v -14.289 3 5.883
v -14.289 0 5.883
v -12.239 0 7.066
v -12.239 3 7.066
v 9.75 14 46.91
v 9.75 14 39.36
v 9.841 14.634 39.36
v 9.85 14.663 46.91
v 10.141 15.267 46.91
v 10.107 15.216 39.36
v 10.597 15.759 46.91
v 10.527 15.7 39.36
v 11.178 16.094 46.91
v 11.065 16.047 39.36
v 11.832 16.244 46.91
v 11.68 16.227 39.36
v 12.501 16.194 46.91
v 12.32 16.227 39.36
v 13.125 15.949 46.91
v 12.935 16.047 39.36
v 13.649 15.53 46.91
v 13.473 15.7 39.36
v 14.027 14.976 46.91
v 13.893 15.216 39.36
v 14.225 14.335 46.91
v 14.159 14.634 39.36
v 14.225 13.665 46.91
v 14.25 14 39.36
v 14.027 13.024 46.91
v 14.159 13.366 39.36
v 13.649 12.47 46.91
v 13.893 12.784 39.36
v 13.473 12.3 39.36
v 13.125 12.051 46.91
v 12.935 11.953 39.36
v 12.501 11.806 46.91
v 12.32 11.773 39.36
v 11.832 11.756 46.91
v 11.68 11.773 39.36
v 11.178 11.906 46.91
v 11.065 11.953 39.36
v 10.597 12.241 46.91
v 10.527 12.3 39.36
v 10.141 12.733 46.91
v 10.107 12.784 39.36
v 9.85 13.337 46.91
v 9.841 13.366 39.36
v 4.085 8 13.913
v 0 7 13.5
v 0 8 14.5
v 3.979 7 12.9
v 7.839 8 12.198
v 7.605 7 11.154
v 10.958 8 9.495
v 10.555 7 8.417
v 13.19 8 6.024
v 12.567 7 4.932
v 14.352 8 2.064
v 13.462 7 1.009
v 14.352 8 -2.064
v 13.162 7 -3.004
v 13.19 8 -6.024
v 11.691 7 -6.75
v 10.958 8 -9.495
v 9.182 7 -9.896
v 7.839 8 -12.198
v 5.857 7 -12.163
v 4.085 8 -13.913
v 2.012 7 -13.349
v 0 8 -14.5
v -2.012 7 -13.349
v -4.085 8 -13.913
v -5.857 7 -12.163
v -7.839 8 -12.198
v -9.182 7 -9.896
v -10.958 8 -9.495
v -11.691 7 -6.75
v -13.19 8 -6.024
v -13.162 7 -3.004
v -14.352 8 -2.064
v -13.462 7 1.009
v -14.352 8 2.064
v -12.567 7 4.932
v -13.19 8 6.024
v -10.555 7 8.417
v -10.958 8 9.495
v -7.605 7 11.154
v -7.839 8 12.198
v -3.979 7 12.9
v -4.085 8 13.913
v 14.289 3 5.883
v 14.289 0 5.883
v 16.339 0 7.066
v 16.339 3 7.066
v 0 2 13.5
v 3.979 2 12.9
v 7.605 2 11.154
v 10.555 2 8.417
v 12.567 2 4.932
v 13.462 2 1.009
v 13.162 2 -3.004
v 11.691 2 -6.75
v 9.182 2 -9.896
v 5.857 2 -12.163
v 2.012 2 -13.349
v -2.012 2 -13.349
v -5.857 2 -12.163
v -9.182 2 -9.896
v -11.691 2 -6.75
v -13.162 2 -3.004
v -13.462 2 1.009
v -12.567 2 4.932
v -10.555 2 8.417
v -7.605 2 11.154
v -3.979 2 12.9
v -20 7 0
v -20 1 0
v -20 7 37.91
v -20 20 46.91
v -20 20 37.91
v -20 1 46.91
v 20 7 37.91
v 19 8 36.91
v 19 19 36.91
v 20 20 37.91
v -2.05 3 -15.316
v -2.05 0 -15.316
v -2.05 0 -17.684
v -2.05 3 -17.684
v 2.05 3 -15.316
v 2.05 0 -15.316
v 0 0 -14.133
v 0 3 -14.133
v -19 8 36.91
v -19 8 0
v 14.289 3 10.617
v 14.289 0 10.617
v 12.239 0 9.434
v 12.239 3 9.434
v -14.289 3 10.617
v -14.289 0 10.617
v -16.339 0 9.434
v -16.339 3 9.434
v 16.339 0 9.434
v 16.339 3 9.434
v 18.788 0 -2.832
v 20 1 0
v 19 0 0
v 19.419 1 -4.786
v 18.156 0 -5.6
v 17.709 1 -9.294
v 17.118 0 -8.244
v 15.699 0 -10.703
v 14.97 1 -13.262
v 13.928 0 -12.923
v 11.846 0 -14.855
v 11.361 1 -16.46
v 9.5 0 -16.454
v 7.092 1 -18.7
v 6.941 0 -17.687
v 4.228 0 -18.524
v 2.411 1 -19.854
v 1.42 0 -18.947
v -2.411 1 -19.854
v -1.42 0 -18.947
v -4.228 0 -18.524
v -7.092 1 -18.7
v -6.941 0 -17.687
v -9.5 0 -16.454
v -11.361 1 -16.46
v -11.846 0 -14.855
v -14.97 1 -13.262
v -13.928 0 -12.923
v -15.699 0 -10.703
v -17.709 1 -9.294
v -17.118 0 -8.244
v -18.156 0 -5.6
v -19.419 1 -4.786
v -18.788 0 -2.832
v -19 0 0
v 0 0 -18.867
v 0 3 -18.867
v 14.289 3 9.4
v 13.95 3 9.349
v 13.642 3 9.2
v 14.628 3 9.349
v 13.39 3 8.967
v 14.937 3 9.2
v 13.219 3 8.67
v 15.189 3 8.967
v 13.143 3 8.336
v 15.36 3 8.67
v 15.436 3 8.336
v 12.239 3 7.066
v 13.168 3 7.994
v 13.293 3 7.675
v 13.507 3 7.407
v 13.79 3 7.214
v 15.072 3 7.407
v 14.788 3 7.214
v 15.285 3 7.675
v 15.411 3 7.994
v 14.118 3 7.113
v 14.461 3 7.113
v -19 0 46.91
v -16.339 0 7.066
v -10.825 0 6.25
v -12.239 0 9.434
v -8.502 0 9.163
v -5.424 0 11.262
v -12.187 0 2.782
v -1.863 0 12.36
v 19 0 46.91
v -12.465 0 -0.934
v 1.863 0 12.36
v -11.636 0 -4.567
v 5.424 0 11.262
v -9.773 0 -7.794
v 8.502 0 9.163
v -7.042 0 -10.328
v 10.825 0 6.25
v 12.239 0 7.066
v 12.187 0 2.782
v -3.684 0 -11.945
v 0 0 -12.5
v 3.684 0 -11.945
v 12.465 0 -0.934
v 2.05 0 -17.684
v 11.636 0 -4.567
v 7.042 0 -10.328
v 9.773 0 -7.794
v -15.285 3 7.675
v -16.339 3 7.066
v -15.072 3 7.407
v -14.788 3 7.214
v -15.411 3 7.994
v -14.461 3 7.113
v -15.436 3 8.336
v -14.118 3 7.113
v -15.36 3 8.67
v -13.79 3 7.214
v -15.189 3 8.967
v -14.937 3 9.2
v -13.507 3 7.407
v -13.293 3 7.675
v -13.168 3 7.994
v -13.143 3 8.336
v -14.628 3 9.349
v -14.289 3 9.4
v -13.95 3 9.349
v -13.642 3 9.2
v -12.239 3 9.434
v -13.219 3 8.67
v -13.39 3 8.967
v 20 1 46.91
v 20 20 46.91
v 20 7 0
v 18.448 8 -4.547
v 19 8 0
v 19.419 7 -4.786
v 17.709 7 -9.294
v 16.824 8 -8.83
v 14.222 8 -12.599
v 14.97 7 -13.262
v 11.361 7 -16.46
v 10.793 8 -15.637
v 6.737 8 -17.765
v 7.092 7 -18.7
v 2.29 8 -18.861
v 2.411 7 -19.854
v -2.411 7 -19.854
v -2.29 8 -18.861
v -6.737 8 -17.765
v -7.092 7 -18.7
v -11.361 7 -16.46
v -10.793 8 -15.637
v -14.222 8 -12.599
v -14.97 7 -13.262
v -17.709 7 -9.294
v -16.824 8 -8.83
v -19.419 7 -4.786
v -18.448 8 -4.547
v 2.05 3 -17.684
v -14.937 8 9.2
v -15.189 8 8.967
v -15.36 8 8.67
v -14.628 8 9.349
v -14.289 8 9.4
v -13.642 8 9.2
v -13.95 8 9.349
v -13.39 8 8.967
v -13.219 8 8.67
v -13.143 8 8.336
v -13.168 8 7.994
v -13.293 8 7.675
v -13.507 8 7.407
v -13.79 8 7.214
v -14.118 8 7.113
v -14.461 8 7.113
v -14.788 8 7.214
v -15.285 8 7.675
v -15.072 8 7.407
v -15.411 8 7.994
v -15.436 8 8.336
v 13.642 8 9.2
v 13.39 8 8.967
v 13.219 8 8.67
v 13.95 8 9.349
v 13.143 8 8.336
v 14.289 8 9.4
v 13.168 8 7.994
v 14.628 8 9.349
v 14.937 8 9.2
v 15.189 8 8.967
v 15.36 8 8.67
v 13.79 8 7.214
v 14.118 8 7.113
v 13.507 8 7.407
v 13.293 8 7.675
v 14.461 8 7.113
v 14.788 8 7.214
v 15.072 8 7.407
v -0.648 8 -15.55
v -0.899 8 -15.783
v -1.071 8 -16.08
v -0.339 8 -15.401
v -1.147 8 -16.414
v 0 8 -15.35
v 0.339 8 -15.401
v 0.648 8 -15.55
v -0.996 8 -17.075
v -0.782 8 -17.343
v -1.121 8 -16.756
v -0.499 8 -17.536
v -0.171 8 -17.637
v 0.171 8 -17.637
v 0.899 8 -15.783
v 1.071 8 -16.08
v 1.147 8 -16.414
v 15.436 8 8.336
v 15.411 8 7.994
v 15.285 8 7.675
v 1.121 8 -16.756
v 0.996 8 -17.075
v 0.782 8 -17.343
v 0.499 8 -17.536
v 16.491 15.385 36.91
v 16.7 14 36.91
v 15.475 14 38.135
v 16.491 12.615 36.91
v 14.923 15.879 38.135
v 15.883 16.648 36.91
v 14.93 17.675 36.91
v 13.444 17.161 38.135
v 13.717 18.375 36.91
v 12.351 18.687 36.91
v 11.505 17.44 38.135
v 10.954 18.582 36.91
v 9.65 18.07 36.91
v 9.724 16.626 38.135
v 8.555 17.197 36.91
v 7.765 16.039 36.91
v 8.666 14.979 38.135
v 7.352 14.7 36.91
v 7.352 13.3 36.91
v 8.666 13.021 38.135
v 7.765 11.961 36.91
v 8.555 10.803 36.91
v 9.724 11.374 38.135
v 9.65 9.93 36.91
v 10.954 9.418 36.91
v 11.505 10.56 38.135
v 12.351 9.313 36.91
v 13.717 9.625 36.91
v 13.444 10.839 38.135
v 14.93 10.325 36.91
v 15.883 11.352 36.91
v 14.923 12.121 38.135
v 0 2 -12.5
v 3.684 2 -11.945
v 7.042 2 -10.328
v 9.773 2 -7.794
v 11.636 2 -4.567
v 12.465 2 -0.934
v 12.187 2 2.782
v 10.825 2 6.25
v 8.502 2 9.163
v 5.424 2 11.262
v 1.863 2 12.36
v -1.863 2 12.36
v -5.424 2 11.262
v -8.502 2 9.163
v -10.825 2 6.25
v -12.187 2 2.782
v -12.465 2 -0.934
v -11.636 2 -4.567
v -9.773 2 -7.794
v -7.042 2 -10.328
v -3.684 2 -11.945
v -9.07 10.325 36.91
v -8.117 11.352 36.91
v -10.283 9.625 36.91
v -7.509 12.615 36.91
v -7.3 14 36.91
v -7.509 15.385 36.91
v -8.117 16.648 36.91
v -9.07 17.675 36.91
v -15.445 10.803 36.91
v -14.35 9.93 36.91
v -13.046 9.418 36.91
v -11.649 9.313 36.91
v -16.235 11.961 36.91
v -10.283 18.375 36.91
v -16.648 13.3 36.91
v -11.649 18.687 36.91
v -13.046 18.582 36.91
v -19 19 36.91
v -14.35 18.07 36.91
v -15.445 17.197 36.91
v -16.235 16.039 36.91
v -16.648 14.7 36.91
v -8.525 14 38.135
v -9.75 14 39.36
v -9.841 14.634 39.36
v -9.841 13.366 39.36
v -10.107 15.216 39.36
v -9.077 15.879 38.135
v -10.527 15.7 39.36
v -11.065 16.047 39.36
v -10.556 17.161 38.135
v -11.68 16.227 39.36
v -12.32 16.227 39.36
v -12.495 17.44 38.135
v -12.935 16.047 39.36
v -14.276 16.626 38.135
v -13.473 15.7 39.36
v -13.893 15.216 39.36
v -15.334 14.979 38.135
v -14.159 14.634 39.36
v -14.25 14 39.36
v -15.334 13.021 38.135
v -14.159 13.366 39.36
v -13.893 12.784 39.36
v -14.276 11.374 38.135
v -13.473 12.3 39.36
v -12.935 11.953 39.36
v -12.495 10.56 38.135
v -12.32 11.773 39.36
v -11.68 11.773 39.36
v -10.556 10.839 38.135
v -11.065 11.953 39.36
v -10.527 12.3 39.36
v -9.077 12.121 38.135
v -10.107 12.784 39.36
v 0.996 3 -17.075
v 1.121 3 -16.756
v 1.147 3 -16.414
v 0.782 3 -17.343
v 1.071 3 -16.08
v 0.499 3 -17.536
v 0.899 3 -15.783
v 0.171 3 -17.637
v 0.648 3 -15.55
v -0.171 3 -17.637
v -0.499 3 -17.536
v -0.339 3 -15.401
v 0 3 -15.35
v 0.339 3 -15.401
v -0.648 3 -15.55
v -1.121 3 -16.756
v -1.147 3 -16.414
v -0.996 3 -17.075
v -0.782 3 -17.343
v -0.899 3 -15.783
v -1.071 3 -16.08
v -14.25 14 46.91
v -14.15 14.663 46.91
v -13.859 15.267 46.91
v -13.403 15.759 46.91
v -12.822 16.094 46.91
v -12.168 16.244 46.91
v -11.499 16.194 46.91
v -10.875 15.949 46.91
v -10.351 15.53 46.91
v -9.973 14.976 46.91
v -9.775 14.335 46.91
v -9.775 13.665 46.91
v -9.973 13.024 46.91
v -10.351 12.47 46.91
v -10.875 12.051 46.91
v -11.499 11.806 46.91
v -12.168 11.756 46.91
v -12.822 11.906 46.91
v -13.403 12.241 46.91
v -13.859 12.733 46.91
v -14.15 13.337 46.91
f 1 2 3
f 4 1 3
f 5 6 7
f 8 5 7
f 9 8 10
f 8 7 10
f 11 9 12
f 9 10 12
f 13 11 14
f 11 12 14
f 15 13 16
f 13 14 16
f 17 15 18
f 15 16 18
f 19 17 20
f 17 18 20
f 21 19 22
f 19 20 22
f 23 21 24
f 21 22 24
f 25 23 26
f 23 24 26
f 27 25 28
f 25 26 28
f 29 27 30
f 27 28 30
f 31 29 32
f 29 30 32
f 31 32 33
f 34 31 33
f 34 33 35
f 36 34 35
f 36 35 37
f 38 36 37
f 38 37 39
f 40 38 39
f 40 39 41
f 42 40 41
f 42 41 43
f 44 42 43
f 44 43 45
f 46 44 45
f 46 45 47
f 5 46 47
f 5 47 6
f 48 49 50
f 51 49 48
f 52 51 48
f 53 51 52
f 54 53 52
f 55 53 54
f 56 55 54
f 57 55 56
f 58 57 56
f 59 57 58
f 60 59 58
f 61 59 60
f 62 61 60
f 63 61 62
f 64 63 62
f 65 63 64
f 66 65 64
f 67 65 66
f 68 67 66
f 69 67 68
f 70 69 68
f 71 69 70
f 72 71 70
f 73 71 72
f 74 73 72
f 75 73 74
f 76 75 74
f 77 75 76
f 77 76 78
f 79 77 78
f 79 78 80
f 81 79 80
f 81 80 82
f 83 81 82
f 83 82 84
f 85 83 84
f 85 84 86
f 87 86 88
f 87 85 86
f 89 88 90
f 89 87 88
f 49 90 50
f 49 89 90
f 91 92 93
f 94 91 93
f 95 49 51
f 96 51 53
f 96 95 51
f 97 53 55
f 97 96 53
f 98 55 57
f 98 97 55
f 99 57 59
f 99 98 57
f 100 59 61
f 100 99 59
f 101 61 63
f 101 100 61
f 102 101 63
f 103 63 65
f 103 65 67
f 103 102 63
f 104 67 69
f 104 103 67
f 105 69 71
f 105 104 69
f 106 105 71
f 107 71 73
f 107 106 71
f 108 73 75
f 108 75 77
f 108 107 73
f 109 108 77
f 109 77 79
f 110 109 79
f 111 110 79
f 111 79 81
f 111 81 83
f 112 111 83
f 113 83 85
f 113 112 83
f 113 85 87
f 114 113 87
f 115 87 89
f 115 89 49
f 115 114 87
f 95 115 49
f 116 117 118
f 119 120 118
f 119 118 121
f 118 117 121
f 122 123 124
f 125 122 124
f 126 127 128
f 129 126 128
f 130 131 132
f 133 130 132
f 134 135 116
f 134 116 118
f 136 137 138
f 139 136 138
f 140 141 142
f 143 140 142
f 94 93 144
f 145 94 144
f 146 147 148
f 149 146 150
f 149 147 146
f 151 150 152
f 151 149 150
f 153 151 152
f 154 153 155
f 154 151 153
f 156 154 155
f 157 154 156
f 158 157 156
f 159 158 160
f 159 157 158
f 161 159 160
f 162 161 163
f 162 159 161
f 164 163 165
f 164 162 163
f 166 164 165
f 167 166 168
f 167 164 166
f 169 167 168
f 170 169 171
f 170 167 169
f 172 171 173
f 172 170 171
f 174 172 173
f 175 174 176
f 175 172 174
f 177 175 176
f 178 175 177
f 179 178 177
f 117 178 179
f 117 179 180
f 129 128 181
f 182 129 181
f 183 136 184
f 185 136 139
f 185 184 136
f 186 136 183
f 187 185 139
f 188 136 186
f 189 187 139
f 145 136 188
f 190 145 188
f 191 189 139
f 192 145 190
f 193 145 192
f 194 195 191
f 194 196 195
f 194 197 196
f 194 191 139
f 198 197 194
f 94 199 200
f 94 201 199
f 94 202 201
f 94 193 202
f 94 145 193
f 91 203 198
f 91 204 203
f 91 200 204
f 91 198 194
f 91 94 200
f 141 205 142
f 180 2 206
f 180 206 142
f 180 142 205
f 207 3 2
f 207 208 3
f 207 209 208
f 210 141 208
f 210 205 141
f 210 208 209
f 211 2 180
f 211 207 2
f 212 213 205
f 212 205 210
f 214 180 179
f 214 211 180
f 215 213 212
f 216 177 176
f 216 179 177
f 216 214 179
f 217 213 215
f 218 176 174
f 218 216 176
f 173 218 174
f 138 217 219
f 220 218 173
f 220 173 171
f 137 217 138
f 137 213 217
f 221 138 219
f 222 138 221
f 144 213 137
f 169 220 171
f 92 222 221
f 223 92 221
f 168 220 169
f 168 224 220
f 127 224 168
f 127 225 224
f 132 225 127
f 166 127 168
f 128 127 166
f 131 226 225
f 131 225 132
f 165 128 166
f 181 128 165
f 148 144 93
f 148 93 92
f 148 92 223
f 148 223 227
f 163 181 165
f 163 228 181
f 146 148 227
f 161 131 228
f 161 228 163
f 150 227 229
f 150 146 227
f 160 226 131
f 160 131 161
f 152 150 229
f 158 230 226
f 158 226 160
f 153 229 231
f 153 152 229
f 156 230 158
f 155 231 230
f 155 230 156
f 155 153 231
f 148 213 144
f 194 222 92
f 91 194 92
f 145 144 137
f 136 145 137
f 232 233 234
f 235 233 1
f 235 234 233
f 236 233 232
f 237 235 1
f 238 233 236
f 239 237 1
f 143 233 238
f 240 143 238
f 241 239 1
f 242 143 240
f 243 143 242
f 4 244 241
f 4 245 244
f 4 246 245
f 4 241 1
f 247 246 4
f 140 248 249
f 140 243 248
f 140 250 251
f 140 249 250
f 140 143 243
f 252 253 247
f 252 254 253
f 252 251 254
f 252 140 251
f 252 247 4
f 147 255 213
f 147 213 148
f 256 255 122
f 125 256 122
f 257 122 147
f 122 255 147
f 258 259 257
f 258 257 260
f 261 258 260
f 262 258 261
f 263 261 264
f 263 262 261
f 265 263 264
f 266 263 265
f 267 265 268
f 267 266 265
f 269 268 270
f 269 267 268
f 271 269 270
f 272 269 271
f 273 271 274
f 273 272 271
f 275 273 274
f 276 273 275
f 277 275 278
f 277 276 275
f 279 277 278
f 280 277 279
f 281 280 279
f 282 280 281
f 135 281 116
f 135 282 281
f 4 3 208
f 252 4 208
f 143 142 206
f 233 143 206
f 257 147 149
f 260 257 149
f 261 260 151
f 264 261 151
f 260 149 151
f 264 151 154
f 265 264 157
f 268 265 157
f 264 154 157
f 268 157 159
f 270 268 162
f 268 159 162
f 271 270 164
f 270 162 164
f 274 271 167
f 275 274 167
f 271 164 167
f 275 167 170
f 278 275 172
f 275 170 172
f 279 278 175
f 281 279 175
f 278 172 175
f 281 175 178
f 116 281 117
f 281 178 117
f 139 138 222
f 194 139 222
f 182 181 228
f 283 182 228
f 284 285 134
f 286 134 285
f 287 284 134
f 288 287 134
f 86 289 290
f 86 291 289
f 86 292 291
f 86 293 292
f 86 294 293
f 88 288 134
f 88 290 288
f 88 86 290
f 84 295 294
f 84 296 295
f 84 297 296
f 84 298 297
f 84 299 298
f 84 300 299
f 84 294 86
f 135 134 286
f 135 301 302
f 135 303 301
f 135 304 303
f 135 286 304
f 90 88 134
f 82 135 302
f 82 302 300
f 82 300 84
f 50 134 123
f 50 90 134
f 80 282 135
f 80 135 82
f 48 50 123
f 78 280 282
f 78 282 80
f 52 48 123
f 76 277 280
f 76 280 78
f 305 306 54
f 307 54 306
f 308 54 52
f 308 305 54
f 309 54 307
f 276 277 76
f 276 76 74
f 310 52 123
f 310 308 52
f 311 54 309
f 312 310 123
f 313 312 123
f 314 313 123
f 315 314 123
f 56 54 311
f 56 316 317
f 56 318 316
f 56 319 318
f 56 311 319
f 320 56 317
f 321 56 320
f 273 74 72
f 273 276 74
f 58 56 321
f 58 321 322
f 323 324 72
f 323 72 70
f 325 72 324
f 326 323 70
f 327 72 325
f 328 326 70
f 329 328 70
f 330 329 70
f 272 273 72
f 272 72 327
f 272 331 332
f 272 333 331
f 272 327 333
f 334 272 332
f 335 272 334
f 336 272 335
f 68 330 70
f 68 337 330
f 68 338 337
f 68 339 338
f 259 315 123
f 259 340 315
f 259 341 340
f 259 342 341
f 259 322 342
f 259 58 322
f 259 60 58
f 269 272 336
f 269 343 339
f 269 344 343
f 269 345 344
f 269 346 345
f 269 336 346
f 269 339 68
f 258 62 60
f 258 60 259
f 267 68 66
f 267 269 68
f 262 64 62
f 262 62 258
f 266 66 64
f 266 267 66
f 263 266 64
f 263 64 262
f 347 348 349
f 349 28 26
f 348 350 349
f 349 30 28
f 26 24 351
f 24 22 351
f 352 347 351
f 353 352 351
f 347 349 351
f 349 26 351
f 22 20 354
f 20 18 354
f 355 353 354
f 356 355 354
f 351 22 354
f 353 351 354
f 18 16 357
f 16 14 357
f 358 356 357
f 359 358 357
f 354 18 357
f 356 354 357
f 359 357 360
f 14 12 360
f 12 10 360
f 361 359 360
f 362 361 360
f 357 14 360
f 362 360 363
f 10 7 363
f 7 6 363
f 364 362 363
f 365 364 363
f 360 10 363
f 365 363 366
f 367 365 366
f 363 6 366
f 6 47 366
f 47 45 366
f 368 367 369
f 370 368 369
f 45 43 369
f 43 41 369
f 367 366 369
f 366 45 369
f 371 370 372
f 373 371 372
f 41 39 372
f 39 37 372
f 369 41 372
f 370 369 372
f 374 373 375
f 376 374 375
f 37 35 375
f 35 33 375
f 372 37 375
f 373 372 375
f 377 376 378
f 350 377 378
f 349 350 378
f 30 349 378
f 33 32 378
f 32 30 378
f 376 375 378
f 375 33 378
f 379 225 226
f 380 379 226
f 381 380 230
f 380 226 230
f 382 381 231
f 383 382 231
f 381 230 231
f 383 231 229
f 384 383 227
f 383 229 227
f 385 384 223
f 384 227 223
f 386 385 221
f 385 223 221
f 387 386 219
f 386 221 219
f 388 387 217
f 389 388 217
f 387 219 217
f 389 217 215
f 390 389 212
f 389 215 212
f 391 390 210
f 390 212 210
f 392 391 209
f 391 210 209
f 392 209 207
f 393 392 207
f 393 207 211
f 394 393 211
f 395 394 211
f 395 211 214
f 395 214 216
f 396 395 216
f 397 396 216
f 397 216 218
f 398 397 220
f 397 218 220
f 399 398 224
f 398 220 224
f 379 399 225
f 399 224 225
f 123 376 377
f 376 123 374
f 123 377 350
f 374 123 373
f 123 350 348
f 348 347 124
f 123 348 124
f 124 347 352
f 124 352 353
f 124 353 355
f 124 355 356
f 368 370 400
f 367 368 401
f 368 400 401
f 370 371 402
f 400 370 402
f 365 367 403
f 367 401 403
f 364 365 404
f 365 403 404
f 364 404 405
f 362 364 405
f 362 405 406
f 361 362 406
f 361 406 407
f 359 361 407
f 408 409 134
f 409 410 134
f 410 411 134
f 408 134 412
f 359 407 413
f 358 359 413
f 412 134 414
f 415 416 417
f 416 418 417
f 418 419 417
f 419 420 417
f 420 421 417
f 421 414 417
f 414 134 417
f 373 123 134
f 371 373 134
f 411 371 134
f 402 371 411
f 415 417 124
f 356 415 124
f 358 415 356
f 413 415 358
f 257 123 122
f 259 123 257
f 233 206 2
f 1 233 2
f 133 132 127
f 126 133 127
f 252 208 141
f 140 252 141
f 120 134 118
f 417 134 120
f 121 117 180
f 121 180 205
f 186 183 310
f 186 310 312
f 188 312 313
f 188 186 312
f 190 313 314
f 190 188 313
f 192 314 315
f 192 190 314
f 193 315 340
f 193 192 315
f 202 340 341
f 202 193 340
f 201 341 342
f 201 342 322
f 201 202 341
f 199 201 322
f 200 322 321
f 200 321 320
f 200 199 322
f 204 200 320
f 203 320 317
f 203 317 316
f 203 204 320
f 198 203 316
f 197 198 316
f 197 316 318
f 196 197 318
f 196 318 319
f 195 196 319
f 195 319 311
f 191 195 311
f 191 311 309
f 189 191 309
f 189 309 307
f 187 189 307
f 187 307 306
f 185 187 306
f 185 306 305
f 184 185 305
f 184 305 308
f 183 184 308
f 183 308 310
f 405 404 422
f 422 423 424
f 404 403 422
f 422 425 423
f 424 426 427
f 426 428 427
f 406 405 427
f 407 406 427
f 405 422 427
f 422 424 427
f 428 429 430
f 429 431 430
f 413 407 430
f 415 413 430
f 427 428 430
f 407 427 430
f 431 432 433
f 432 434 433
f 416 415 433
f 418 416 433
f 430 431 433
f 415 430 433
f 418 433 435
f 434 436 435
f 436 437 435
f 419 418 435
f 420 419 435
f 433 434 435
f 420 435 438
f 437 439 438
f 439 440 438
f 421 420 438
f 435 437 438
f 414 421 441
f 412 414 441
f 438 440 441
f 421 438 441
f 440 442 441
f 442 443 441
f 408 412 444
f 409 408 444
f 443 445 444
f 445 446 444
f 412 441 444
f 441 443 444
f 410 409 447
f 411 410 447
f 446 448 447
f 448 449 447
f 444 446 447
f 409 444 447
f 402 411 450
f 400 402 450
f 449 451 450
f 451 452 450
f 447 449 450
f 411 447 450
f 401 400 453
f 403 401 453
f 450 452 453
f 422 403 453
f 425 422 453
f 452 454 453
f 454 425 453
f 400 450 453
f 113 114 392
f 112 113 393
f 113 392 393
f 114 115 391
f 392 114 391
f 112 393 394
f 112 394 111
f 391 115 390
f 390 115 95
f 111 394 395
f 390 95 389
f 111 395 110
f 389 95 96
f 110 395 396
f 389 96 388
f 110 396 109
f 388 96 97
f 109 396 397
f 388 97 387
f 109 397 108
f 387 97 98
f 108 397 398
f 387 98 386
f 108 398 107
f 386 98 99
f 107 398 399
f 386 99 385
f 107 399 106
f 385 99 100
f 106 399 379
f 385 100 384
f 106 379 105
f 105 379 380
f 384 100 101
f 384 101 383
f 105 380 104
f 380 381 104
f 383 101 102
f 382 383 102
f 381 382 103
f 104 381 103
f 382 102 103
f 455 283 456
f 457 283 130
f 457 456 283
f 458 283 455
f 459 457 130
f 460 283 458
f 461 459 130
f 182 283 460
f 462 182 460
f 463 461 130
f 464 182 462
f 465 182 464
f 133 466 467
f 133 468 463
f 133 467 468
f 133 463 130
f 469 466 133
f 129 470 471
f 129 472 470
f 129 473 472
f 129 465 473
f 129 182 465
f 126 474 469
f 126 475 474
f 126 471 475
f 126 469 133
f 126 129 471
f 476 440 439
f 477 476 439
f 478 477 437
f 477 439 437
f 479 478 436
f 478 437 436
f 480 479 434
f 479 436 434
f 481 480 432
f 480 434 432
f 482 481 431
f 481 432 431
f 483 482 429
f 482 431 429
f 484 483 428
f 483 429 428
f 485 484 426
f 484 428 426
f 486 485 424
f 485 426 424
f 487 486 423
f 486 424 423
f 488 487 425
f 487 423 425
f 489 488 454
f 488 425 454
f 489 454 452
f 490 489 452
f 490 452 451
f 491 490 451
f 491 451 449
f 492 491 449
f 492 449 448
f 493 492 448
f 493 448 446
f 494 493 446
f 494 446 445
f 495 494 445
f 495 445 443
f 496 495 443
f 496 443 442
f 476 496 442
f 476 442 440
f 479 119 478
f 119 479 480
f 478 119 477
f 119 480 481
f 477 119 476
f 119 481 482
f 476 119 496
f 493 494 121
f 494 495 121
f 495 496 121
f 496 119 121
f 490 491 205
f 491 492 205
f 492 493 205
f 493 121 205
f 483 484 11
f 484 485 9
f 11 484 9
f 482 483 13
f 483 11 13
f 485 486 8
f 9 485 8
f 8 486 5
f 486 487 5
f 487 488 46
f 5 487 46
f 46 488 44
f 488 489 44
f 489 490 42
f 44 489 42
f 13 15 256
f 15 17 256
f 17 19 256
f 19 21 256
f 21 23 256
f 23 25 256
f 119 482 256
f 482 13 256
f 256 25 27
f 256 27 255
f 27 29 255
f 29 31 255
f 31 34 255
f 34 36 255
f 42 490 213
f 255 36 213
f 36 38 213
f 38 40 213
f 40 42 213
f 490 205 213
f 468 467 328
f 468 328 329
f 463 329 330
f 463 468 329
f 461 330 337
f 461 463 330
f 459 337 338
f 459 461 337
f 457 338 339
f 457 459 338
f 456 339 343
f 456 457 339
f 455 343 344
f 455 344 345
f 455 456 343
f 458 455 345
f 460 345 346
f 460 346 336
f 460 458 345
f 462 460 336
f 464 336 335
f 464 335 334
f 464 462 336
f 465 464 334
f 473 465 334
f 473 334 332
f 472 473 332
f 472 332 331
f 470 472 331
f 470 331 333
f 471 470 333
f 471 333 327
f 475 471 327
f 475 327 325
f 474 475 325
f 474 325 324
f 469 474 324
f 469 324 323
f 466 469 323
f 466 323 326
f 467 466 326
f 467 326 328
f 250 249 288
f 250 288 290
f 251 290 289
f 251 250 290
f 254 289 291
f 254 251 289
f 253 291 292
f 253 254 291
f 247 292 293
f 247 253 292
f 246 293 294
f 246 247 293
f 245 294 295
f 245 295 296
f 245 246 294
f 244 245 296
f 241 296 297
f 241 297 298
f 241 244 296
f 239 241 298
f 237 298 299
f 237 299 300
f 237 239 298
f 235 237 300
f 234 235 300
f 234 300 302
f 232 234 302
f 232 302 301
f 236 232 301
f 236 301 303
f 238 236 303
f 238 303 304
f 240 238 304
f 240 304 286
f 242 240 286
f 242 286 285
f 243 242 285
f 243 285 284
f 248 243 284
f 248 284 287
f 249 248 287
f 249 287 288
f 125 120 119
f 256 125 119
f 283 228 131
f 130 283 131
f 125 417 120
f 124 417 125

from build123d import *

# Parameters (mm, degrees)
ESQUISSE1_R                  = 1.15
ESQUISSE1_R_2                = 13.5
BOSS_EXTRU_1_DEPTH           = 8
ESQUISSE2_R                  = 13.5
ESQUISSE2_R_2                = 12.5
BOSS_EXTRU_2_DEPTH           = 2
ENL_V_MAT_EXTRU_1_DEPTH      = 3
R_P_TITION_CIRCULAIRE1_COUNT = 3
ESQUISSE4_W                  = 10
ESQUISSE4_H                  = 20
BOSS_EXTRU_3_DEPTH           = 40
PER_AGEAVANC_1_OUTLINE_R     = 2.25
PER_AGEAVANC_1_DEPTH         = 2.45
PER_AGEAVANC_1_DRAFT         = 45
PER_AGEAVANC_1_2_OUTLINE_R   = 2.25
PER_AGEAVANC_1_2_DEPTH       = 2.45
PER_AGEAVANC_1_2_DRAFT       = 45
ESQUISSE7_R                  = 2.25
ENL_V_MAT_EXTRU_2_DEPTH      = 66.754160325
CHANFREIN1_SIZE              = 1


# Read off the part's stored shape, not the designer's step: PerçageAvancé1
with BuildPart() as part:
    # Esquisse1 → Boss.-Extru.1 (new body)
    with BuildSketch(Plane(origin=(0, 0, 0), x_dir=(1, 0, 0), z_dir=(0, 1, 0))):
        with BuildLine():
            Line((20, -46.91), (20, 0))
            ThreePointArc((20, 0), (0, 20), (-20, 0))
            Line((-20, 0), (-20, -46.91))
            Line((-20, -46.91), (20, -46.91))
        make_face()
        with Locations(Location((0, 16.5, 0), (0, 0, 270))):
            Circle(ESQUISSE1_R, mode=Mode.SUBTRACT)
        with Locations(Location((-14.289419162, -8.25, 0), (0, 0, 270))):
            Circle(ESQUISSE1_R, mode=Mode.SUBTRACT)
        with Locations(Location((0, 0, 0), (0, 0, 270))):
            Circle(ESQUISSE1_R_2, mode=Mode.SUBTRACT)
        with Locations(Location((14.289419162, -8.25, 0), (0, 0, 270))):
            Circle(ESQUISSE1_R, mode=Mode.SUBTRACT)
    extrude(amount=BOSS_EXTRU_1_DEPTH)

    # Esquisse2 → Boss.-Extru.2 (add)
    with BuildSketch(Plane.XZ):
        with Locations(Location((0, 0, 0), (0, 0, 270))):
            Circle(ESQUISSE2_R)
        with Locations(Location((0, 0, 0), (0, 0, 270))):
            Circle(ESQUISSE2_R_2, mode=Mode.SUBTRACT)
    extrude(amount=-BOSS_EXTRU_2_DEPTH)

    # Esquisse3 → Enlèv. mat.-Extru.1 (cut)
    with BuildSketch(Plane.XZ):
        Polygon((-14.289419162, 5.882863896), (-12.239419162, 7.066431948), (-12.239419162, 9.433568052), (-14.289419162, 10.617136104), (-16.339419162, 9.433568052), (-16.339419162, 7.066431948), align=None)
    enl_v_mat_extru_1 = extrude(amount=-ENL_V_MAT_EXTRU_1_DEPTH, mode=Mode.SUBTRACT)

    # Répétition circulaire1: Enlèv. mat.-Extru.1 ×3 about axis
    r_p_tition_circulaire1_axis = Axis((0, 0, 0), (0, 1, 0))
    for i in range(1, R_P_TITION_CIRCULAIRE1_COUNT):
        add(enl_v_mat_extru_1.rotate(r_p_tition_circulaire1_axis, i * 360 / R_P_TITION_CIRCULAIRE1_COUNT), mode=Mode.SUBTRACT)

    # Esquisse4 → Boss.-Extru.3 (add)
    with BuildSketch(Plane.ZY.offset(20)):
        with Locations((41.91, 10)):
            Rectangle(ESQUISSE4_W, ESQUISSE4_H)
    extrude(amount=-BOSS_EXTRU_3_DEPTH)


with BuildPart() as per_ageavanc_1_tool:
    # PerçageAvancé1 outline → PerçageAvancé1 (with draft: the straight prism first)
    with BuildSketch(Plane.XY.offset(39.36)):
        with Locations((-12, 14)):
            Circle(PER_AGEAVANC_1_OUTLINE_R)
    extrude(amount=-PER_AGEAVANC_1_DEPTH)
    # PerçageAvancé1: the draft: its side faces are tilted about the plane it starts from
    per_ageavanc_1_sides = [per_ageavanc_1_tool.faces().sort_by_distance(p)[0] for p in [
        (-14.25, 14, 38.135),
    ]]
    draft(per_ageavanc_1_sides, Plane.XY.offset(39.36), PER_AGEAVANC_1_DRAFT)


with BuildPart() as part_1:
    add(part.part)

    # PerçageAvancé1: cut by per_ageavanc_1_tool
    add(per_ageavanc_1_tool.part, mode=Mode.SUBTRACT)


with BuildPart() as per_ageavanc_1_2_tool:
    # Per_ageAvanc_1 2 outline → Per_ageAvanc_1 2 (with draft: the straight prism first)
    with BuildSketch(Plane.XY.offset(39.36)):
        with Locations((12, 14)):
            Circle(PER_AGEAVANC_1_2_OUTLINE_R)
    extrude(amount=-PER_AGEAVANC_1_2_DEPTH)
    # Per_ageAvanc_1 2: the draft: its side faces are tilted about the plane it starts from
    per_ageavanc_1_2_sides = [per_ageavanc_1_2_tool.faces().sort_by_distance(p)[0] for p in [
        (9.75, 14, 38.135),
    ]]
    draft(per_ageavanc_1_2_sides, Plane.XY.offset(39.36), PER_AGEAVANC_1_2_DRAFT)


with BuildPart() as part_2:
    add(part_1.part)

    # Per_ageAvanc_1 2: cut by per_ageavanc_1_2_tool
    add(per_ageavanc_1_2_tool.part, mode=Mode.SUBTRACT)

    # Esquisse7 → Enlèv. mat.-Extru.2 (cut, through all)
    with BuildSketch(Plane(origin=(0, 0, 39.36), x_dir=(-1, 0, 0), z_dir=(0, 0, -1))):
        with Locations((-12, 14)):
            Circle(ESQUISSE7_R)
        with Locations((12, 14)):
            Circle(ESQUISSE7_R)
    extrude(amount=-ENL_V_MAT_EXTRU_2_DEPTH, mode=Mode.SUBTRACT)

    # Chanfrein1
    chanfrein1_edges = [part_2.edges().sort_by_distance(p)[0] for p in [
        (20, 8, 18.455),
        (20, 14, 36.91),
        (0, 20, 36.91),
        (-20, 14, 36.91),
        (-20, 8, 18.455),
        (0, 8, -20),
        (0, 0, -20),
        (0, 8, -13.5),
        (20, 0, 23.455),
        (-20, 0, 23.455),
    ]]
    chamfer(chanfrein1_edges, length=CHANFREIN1_SIZE)


solid = part_2.part
